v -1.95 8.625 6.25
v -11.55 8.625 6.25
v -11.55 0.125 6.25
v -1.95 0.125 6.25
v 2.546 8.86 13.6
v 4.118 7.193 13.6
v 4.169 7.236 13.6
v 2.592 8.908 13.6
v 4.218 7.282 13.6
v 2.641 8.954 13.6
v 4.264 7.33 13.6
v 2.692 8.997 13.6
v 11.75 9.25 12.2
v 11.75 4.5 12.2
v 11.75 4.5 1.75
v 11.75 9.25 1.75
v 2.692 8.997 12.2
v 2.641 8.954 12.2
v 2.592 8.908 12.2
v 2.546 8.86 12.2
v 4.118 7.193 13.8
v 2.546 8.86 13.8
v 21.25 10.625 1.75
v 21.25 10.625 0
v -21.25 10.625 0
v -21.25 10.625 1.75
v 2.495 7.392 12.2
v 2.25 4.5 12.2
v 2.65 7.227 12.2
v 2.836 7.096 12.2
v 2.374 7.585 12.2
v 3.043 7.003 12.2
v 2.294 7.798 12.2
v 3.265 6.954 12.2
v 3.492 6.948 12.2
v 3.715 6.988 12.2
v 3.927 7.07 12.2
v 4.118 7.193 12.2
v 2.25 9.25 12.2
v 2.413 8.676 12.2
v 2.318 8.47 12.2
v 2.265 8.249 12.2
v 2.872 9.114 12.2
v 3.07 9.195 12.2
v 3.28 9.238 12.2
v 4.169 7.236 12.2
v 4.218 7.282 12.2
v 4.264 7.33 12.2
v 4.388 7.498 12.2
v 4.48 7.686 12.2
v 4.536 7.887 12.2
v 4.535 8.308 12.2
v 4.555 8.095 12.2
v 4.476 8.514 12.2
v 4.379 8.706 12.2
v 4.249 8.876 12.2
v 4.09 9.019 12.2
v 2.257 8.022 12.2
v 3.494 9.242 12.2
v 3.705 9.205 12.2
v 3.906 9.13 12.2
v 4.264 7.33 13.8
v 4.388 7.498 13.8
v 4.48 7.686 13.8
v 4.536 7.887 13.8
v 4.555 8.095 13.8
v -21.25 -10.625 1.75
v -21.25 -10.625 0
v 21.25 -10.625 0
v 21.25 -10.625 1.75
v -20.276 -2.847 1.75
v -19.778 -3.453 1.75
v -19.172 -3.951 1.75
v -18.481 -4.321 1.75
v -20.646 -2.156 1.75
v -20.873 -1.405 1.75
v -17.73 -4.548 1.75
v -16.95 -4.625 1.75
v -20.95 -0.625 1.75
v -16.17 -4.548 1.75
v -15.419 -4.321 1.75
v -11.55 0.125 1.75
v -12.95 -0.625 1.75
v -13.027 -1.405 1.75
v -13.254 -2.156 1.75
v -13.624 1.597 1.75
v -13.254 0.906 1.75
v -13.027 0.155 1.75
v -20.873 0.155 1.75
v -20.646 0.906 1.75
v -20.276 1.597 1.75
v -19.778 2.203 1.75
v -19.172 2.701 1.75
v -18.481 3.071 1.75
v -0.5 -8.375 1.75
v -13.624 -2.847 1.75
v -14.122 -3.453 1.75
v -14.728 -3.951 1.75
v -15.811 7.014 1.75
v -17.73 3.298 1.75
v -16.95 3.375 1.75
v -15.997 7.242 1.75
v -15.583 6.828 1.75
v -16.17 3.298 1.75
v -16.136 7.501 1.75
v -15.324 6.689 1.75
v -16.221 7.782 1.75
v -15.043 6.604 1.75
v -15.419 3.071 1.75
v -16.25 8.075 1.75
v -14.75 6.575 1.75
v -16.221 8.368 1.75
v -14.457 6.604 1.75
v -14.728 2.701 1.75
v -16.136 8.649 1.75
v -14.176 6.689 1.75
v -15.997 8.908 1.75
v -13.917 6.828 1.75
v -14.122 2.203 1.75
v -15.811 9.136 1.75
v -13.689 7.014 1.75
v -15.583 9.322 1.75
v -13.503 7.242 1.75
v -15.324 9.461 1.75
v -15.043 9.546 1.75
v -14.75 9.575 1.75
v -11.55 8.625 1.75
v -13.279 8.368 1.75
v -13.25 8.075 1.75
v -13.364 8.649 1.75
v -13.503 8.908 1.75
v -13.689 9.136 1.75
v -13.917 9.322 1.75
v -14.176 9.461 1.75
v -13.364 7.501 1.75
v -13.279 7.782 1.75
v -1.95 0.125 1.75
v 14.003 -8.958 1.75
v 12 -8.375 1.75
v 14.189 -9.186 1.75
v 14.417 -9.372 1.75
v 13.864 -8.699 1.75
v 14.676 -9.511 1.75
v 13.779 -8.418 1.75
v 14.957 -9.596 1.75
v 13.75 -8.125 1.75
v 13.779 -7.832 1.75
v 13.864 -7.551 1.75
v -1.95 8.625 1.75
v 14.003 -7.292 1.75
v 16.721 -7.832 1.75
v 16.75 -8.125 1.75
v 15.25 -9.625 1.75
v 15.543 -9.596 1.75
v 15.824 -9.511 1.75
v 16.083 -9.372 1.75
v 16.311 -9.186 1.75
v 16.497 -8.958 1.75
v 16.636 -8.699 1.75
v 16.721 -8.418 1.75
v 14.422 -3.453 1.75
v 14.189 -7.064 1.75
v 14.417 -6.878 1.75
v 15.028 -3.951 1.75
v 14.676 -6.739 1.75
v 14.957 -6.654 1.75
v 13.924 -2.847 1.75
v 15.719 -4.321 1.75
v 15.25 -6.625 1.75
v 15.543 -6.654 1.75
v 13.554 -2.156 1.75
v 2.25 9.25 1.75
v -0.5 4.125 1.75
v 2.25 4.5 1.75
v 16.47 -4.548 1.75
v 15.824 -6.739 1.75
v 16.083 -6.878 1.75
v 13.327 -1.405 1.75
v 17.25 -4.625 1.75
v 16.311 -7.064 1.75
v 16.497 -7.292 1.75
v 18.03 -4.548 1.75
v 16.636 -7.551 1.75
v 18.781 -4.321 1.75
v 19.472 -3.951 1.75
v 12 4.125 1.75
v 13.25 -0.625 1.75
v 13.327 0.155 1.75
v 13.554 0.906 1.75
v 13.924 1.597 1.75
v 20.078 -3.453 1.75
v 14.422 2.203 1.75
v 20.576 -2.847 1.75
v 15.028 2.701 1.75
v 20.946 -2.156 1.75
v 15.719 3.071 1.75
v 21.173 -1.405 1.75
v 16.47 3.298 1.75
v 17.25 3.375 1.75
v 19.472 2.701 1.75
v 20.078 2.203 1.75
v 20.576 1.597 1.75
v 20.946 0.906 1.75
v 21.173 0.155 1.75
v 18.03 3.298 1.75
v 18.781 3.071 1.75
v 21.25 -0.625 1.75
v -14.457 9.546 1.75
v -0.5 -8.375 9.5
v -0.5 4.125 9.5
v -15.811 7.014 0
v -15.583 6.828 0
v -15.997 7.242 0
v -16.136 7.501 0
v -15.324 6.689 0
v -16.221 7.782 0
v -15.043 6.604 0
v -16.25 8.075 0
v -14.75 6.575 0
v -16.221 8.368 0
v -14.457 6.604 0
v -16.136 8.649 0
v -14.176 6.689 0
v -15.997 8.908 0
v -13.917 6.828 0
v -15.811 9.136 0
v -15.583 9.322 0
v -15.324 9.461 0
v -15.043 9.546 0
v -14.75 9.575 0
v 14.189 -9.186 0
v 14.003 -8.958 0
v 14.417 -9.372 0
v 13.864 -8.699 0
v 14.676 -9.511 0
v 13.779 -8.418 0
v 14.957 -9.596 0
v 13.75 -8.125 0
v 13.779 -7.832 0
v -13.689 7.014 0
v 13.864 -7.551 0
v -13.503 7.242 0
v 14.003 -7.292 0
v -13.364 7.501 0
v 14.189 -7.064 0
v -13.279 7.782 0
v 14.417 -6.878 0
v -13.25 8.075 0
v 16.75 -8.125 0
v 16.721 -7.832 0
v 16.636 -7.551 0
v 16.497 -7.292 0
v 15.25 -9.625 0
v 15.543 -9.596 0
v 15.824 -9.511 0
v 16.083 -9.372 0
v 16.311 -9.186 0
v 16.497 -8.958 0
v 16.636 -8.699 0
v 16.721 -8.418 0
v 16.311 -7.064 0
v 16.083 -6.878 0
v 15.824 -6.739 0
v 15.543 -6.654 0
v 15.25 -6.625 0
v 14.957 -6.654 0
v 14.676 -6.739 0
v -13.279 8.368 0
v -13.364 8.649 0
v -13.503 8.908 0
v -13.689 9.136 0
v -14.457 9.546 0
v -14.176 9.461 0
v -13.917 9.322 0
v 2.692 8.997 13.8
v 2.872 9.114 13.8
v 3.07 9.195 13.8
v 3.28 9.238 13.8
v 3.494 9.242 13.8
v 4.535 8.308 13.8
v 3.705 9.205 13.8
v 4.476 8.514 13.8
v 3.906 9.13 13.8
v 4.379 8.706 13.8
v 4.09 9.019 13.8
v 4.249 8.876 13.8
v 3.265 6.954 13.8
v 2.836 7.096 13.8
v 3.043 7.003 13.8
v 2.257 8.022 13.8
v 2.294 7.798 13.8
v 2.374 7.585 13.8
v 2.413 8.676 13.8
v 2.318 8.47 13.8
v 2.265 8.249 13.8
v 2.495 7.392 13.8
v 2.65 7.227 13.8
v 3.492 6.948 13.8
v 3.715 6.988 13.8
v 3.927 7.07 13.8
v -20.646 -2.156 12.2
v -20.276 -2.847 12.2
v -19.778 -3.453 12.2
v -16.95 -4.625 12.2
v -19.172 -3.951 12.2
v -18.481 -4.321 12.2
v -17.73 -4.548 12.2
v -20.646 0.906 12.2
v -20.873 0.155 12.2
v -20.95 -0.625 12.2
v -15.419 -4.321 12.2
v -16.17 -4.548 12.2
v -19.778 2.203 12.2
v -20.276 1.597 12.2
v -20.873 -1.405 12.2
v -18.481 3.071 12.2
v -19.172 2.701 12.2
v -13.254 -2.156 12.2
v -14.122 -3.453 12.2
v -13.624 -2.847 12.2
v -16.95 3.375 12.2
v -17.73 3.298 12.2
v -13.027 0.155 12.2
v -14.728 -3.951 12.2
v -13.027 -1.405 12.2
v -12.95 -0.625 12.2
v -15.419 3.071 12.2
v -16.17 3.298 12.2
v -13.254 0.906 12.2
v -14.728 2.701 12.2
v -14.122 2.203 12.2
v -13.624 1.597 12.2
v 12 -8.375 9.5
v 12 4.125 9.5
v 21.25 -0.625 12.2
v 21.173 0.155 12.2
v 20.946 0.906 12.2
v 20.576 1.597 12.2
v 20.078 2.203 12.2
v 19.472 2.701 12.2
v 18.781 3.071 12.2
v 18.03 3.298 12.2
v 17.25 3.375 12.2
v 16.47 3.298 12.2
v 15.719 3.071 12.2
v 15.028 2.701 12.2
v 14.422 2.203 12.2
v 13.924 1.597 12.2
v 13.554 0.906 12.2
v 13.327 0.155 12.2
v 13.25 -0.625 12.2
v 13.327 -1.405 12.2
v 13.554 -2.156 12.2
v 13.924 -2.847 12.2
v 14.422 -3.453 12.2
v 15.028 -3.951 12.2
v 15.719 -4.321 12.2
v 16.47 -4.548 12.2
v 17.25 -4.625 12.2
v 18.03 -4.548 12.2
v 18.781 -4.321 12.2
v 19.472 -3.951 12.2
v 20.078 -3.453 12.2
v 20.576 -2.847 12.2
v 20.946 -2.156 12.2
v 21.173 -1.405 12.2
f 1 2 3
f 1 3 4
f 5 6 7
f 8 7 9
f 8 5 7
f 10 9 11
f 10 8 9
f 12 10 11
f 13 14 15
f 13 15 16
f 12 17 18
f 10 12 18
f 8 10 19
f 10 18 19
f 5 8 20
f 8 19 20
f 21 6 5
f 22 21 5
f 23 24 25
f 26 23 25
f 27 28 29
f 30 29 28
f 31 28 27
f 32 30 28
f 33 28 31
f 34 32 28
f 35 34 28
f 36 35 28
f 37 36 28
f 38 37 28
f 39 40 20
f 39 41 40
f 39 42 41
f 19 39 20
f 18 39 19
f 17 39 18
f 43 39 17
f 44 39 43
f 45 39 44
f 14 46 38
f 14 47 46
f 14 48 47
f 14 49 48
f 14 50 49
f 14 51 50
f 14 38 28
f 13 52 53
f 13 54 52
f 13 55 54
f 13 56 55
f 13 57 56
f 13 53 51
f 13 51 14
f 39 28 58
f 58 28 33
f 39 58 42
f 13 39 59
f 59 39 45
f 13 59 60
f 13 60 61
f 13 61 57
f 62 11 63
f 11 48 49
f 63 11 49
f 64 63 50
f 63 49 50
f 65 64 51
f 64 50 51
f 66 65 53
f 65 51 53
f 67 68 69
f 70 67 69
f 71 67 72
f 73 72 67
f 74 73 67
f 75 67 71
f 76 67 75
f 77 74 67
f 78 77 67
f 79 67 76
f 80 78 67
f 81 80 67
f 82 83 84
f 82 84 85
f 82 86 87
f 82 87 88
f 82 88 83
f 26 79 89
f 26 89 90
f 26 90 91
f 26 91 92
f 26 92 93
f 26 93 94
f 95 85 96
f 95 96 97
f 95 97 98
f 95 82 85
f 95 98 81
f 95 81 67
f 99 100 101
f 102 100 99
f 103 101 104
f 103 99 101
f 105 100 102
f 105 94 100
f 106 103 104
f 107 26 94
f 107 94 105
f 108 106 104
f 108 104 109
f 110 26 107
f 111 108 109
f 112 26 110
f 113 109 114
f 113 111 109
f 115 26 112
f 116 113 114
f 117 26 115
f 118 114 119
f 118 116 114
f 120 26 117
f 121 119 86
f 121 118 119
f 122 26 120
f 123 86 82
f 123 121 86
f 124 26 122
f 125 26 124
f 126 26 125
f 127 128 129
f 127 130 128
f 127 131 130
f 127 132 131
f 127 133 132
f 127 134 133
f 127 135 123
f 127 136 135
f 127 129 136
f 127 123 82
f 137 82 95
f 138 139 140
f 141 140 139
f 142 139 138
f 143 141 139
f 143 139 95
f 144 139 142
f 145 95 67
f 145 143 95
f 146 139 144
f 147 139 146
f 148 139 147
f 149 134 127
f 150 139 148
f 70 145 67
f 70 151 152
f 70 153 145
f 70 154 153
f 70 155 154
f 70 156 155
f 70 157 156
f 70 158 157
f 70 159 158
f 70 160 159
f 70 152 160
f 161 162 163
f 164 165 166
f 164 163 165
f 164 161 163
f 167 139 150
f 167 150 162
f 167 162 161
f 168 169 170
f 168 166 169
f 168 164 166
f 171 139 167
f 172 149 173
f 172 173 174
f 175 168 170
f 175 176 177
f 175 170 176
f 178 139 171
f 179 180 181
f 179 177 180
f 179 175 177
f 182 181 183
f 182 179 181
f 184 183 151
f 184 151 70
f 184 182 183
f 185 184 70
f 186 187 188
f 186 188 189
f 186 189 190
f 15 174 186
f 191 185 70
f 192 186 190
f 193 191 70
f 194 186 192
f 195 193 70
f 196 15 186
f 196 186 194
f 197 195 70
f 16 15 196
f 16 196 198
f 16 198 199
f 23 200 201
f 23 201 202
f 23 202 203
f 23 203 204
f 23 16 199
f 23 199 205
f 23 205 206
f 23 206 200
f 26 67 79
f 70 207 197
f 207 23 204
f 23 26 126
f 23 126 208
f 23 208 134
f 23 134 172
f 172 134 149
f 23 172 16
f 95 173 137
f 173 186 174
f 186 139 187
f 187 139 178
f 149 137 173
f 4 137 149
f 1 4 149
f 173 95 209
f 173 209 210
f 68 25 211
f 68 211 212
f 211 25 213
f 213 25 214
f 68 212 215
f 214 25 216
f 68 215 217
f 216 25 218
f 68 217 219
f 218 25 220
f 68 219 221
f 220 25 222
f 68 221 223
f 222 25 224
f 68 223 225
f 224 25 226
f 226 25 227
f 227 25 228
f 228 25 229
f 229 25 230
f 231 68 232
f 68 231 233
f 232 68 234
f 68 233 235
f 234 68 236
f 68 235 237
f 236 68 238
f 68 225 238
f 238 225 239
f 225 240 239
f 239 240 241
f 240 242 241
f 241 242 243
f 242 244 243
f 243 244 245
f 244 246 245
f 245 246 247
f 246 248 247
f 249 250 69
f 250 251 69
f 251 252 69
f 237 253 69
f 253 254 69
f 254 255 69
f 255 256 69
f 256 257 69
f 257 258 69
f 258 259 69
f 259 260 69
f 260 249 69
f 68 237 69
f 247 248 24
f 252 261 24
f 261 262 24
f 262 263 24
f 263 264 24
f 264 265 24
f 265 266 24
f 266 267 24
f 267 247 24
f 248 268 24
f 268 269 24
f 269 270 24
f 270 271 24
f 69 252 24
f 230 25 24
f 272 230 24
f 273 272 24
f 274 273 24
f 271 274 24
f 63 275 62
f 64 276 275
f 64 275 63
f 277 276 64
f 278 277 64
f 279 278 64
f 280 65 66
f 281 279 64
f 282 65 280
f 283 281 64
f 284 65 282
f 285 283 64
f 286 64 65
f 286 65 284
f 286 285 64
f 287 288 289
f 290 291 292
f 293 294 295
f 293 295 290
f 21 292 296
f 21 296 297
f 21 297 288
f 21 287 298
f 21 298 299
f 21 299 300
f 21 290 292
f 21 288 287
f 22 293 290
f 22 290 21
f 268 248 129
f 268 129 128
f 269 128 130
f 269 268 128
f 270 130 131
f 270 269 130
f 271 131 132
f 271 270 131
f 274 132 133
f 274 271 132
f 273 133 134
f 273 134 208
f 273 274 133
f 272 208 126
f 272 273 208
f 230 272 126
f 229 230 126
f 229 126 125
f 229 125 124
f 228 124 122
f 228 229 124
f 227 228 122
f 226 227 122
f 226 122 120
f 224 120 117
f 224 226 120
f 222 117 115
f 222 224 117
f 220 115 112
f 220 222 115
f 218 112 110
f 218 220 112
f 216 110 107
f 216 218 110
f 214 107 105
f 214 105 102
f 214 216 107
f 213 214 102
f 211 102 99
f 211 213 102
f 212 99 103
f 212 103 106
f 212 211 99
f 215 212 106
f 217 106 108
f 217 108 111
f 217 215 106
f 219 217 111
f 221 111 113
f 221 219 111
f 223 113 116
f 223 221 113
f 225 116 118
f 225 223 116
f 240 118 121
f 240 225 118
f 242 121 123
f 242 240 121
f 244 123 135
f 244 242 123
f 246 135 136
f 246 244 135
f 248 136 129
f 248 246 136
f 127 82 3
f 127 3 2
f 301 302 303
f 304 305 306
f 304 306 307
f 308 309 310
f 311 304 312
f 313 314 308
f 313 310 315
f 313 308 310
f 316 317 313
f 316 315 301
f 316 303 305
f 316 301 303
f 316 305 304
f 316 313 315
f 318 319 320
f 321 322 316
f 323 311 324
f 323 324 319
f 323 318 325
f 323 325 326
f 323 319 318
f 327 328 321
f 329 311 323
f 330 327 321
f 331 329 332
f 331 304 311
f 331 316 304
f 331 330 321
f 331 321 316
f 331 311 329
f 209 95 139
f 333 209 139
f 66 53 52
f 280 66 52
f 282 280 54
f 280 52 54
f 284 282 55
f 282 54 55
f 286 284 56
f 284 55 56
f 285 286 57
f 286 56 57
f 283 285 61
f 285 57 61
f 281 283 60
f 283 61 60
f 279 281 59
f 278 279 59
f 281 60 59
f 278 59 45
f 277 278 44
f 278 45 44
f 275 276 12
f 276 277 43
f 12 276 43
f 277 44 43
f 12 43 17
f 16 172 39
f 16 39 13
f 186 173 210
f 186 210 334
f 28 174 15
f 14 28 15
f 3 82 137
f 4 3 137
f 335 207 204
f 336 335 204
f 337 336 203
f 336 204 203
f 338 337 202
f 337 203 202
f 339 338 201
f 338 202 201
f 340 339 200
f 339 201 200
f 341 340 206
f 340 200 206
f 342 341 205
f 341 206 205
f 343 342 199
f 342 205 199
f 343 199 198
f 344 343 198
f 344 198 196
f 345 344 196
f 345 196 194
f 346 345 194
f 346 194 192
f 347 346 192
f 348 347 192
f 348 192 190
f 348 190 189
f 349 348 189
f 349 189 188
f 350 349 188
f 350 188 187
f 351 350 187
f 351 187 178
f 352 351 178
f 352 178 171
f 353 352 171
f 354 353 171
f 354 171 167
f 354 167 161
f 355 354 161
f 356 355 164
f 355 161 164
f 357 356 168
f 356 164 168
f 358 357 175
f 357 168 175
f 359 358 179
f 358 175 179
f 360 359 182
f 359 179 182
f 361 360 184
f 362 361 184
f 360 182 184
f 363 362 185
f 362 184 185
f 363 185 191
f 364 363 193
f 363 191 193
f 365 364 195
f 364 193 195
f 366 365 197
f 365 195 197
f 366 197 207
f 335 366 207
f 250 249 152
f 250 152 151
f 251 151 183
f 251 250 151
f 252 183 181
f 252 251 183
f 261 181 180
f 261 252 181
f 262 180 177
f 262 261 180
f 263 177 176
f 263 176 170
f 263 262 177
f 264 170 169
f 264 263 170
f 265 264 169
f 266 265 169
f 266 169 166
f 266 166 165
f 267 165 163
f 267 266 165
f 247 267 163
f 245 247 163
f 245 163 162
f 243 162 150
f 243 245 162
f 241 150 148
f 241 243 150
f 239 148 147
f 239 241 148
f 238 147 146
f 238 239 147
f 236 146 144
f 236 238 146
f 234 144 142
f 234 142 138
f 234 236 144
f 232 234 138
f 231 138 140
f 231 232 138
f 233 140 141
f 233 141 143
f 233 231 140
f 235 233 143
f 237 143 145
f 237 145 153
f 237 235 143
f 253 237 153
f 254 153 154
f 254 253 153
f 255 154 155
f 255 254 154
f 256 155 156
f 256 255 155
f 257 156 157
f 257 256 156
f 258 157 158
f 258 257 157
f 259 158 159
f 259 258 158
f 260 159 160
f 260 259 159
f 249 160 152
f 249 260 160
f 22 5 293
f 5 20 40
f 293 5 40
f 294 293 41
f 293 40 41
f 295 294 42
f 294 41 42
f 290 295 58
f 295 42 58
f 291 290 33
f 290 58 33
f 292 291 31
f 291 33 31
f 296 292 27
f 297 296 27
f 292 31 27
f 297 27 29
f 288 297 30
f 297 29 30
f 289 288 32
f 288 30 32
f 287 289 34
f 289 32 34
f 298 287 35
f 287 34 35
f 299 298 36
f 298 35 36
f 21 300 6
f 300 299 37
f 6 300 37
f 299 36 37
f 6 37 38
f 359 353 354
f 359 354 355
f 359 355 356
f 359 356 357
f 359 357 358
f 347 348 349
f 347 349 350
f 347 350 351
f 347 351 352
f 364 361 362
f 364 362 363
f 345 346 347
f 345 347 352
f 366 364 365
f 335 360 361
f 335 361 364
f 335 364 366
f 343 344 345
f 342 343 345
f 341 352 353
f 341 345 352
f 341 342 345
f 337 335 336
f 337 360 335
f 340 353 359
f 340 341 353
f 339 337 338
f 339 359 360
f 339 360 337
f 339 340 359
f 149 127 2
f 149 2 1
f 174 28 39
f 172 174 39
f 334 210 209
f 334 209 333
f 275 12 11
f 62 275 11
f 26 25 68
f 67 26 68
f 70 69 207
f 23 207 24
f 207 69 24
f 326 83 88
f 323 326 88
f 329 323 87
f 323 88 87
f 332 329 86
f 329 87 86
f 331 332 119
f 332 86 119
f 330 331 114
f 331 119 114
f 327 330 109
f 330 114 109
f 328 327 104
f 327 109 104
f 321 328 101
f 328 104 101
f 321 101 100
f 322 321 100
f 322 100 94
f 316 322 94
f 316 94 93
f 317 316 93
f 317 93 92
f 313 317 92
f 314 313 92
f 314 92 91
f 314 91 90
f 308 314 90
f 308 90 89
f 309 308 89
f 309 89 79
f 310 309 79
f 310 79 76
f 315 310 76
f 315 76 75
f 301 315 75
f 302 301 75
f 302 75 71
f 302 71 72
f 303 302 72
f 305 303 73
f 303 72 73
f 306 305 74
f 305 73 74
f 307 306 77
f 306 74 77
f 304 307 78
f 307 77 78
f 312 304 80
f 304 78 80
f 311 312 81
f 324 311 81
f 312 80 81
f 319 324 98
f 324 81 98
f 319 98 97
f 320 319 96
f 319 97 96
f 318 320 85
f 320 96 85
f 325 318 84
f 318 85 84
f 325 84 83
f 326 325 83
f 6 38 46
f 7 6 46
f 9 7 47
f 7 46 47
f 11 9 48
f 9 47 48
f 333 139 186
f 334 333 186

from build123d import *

# Parameters (mm, degrees)
F0_R     = 4
F0_R_2   = 1.5
F0_W     = 12.5
F0_H     = 12.5
F0_W_2   = 9.6
F0_H_2   = 8.5
F0_W_3   = 9.5
F0_H_3   = 4.75
F1_DEPTH = 1.75
F2_DEPTH = 12.2
F3_DEPTH = 6.25
F4_DEPTH = 9.5
F6_DEPTH = 1.6
F7_DEPTH = 1.4


# Not quite as in the source:
# - a feature names something its author has since deleted; it is built from what else it names


with BuildPart() as f1:
    # F0 (on Top) → F1 (new body)
    with BuildSketch(Plane.XY):
        Polygon((-21.25, 10.625), (-21.25, -10.625), (21.25, -10.625), (21.25, -0.625), (21.25, 10.625), align=None)
        with Locations((-16.95, -0.625)):
            Circle(F0_R, mode=Mode.SUBTRACT)
        with Locations((15.25, -8.125)):
            Circle(F0_R_2, mode=Mode.SUBTRACT)
        with Locations((5.75, -2.125)):
            Rectangle(F0_W, F0_H, mode=Mode.SUBTRACT)
        with Locations((17.25, -0.625)):
            Circle(F0_R, mode=Mode.SUBTRACT)
        with Locations((-6.75, 4.375)):
            Rectangle(F0_W_2, F0_H_2, mode=Mode.SUBTRACT)
        with Locations((-14.75, 8.075)):
            Circle(F0_R_2, mode=Mode.SUBTRACT)
        with Locations((7, 6.875)):
            Rectangle(F0_W_3, F0_H_3, mode=Mode.SUBTRACT)
        with Locations((7, 6.875)):
            Rectangle(F0_W_3, F0_H_3)
        with Locations((-6.75, 4.375)):
            Rectangle(F0_W_2, F0_H_2)
        with Locations((17.25, -0.625)):
            Circle(F0_R)
        with Locations((-16.95, -0.625)):
            Circle(F0_R)
    extrude(amount=F1_DEPTH)

    # F0 (on Top) → F2 (join)
    with BuildSketch(Plane.XY):
        with Locations((17.25, -0.625)):
            Circle(F0_R)
        with Locations((7, 6.875)):
            Rectangle(F0_W_3, F0_H_3)
        with Locations((-16.95, -0.625)):
            Circle(F0_R)
    extrude(amount=F2_DEPTH)

    # F0 (on Top) → F3 (join)
    with BuildSketch(Plane.XY):
        with Locations((-6.75, 4.375)):
            Rectangle(F0_W_2, F0_H_2)
    extrude(amount=F3_DEPTH)

    # F0 (on Top) → F4 (join)
    with BuildSketch(Plane.XY):
        with Locations((5.75, -2.125)):
            Rectangle(F0_W, F0_H)
    extrude(amount=F4_DEPTH)

    # F5 (on face) → F6 (join)
    with BuildSketch(Plane.XY.offset(12.2)):
        with BuildLine():
            Line((4.1182401625, 7.1928977493), (2.5462530026, 8.8598879621))
            ThreePointArc((2.5462530026, 8.8598879621), (2.5683356993, 7.3060178406), (4.1182401625, 7.1928977493))
        make_face()
        with BuildLine():
            ThreePointArc((4.2637469974, 7.3301120379), (4.4797229985, 7.6857684317), (4.555, 8.095))
            ThreePointArc((4.555, 8.095), (3.906135617, 9.1300667096), (2.6917598375, 8.9971022507))
            Line((2.6917598375, 8.9971022507), (4.2637469974, 7.3301120379))
        make_face()
    extrude(amount=F6_DEPTH)

    # F5 (on face) → F7 (join)
    with BuildSketch(Plane.XY.offset(12.2)):
        with BuildLine():
            Line((4.2637469974, 7.3301120379), (2.6917598375, 8.9971022507))
            ThreePointArc((2.6917598375, 8.9971022507), (2.6160178406, 8.9316643007), (2.5462530026, 8.8598879621))
            Line((2.5462530026, 8.8598879621), (4.1182401625, 7.1928977493))
            ThreePointArc((4.1182401625, 7.1928977493), (4.1939821594, 7.2583356993), (4.2637469974, 7.3301120379))
        make_face()
    extrude(amount=F7_DEPTH)


solid = f1.part
